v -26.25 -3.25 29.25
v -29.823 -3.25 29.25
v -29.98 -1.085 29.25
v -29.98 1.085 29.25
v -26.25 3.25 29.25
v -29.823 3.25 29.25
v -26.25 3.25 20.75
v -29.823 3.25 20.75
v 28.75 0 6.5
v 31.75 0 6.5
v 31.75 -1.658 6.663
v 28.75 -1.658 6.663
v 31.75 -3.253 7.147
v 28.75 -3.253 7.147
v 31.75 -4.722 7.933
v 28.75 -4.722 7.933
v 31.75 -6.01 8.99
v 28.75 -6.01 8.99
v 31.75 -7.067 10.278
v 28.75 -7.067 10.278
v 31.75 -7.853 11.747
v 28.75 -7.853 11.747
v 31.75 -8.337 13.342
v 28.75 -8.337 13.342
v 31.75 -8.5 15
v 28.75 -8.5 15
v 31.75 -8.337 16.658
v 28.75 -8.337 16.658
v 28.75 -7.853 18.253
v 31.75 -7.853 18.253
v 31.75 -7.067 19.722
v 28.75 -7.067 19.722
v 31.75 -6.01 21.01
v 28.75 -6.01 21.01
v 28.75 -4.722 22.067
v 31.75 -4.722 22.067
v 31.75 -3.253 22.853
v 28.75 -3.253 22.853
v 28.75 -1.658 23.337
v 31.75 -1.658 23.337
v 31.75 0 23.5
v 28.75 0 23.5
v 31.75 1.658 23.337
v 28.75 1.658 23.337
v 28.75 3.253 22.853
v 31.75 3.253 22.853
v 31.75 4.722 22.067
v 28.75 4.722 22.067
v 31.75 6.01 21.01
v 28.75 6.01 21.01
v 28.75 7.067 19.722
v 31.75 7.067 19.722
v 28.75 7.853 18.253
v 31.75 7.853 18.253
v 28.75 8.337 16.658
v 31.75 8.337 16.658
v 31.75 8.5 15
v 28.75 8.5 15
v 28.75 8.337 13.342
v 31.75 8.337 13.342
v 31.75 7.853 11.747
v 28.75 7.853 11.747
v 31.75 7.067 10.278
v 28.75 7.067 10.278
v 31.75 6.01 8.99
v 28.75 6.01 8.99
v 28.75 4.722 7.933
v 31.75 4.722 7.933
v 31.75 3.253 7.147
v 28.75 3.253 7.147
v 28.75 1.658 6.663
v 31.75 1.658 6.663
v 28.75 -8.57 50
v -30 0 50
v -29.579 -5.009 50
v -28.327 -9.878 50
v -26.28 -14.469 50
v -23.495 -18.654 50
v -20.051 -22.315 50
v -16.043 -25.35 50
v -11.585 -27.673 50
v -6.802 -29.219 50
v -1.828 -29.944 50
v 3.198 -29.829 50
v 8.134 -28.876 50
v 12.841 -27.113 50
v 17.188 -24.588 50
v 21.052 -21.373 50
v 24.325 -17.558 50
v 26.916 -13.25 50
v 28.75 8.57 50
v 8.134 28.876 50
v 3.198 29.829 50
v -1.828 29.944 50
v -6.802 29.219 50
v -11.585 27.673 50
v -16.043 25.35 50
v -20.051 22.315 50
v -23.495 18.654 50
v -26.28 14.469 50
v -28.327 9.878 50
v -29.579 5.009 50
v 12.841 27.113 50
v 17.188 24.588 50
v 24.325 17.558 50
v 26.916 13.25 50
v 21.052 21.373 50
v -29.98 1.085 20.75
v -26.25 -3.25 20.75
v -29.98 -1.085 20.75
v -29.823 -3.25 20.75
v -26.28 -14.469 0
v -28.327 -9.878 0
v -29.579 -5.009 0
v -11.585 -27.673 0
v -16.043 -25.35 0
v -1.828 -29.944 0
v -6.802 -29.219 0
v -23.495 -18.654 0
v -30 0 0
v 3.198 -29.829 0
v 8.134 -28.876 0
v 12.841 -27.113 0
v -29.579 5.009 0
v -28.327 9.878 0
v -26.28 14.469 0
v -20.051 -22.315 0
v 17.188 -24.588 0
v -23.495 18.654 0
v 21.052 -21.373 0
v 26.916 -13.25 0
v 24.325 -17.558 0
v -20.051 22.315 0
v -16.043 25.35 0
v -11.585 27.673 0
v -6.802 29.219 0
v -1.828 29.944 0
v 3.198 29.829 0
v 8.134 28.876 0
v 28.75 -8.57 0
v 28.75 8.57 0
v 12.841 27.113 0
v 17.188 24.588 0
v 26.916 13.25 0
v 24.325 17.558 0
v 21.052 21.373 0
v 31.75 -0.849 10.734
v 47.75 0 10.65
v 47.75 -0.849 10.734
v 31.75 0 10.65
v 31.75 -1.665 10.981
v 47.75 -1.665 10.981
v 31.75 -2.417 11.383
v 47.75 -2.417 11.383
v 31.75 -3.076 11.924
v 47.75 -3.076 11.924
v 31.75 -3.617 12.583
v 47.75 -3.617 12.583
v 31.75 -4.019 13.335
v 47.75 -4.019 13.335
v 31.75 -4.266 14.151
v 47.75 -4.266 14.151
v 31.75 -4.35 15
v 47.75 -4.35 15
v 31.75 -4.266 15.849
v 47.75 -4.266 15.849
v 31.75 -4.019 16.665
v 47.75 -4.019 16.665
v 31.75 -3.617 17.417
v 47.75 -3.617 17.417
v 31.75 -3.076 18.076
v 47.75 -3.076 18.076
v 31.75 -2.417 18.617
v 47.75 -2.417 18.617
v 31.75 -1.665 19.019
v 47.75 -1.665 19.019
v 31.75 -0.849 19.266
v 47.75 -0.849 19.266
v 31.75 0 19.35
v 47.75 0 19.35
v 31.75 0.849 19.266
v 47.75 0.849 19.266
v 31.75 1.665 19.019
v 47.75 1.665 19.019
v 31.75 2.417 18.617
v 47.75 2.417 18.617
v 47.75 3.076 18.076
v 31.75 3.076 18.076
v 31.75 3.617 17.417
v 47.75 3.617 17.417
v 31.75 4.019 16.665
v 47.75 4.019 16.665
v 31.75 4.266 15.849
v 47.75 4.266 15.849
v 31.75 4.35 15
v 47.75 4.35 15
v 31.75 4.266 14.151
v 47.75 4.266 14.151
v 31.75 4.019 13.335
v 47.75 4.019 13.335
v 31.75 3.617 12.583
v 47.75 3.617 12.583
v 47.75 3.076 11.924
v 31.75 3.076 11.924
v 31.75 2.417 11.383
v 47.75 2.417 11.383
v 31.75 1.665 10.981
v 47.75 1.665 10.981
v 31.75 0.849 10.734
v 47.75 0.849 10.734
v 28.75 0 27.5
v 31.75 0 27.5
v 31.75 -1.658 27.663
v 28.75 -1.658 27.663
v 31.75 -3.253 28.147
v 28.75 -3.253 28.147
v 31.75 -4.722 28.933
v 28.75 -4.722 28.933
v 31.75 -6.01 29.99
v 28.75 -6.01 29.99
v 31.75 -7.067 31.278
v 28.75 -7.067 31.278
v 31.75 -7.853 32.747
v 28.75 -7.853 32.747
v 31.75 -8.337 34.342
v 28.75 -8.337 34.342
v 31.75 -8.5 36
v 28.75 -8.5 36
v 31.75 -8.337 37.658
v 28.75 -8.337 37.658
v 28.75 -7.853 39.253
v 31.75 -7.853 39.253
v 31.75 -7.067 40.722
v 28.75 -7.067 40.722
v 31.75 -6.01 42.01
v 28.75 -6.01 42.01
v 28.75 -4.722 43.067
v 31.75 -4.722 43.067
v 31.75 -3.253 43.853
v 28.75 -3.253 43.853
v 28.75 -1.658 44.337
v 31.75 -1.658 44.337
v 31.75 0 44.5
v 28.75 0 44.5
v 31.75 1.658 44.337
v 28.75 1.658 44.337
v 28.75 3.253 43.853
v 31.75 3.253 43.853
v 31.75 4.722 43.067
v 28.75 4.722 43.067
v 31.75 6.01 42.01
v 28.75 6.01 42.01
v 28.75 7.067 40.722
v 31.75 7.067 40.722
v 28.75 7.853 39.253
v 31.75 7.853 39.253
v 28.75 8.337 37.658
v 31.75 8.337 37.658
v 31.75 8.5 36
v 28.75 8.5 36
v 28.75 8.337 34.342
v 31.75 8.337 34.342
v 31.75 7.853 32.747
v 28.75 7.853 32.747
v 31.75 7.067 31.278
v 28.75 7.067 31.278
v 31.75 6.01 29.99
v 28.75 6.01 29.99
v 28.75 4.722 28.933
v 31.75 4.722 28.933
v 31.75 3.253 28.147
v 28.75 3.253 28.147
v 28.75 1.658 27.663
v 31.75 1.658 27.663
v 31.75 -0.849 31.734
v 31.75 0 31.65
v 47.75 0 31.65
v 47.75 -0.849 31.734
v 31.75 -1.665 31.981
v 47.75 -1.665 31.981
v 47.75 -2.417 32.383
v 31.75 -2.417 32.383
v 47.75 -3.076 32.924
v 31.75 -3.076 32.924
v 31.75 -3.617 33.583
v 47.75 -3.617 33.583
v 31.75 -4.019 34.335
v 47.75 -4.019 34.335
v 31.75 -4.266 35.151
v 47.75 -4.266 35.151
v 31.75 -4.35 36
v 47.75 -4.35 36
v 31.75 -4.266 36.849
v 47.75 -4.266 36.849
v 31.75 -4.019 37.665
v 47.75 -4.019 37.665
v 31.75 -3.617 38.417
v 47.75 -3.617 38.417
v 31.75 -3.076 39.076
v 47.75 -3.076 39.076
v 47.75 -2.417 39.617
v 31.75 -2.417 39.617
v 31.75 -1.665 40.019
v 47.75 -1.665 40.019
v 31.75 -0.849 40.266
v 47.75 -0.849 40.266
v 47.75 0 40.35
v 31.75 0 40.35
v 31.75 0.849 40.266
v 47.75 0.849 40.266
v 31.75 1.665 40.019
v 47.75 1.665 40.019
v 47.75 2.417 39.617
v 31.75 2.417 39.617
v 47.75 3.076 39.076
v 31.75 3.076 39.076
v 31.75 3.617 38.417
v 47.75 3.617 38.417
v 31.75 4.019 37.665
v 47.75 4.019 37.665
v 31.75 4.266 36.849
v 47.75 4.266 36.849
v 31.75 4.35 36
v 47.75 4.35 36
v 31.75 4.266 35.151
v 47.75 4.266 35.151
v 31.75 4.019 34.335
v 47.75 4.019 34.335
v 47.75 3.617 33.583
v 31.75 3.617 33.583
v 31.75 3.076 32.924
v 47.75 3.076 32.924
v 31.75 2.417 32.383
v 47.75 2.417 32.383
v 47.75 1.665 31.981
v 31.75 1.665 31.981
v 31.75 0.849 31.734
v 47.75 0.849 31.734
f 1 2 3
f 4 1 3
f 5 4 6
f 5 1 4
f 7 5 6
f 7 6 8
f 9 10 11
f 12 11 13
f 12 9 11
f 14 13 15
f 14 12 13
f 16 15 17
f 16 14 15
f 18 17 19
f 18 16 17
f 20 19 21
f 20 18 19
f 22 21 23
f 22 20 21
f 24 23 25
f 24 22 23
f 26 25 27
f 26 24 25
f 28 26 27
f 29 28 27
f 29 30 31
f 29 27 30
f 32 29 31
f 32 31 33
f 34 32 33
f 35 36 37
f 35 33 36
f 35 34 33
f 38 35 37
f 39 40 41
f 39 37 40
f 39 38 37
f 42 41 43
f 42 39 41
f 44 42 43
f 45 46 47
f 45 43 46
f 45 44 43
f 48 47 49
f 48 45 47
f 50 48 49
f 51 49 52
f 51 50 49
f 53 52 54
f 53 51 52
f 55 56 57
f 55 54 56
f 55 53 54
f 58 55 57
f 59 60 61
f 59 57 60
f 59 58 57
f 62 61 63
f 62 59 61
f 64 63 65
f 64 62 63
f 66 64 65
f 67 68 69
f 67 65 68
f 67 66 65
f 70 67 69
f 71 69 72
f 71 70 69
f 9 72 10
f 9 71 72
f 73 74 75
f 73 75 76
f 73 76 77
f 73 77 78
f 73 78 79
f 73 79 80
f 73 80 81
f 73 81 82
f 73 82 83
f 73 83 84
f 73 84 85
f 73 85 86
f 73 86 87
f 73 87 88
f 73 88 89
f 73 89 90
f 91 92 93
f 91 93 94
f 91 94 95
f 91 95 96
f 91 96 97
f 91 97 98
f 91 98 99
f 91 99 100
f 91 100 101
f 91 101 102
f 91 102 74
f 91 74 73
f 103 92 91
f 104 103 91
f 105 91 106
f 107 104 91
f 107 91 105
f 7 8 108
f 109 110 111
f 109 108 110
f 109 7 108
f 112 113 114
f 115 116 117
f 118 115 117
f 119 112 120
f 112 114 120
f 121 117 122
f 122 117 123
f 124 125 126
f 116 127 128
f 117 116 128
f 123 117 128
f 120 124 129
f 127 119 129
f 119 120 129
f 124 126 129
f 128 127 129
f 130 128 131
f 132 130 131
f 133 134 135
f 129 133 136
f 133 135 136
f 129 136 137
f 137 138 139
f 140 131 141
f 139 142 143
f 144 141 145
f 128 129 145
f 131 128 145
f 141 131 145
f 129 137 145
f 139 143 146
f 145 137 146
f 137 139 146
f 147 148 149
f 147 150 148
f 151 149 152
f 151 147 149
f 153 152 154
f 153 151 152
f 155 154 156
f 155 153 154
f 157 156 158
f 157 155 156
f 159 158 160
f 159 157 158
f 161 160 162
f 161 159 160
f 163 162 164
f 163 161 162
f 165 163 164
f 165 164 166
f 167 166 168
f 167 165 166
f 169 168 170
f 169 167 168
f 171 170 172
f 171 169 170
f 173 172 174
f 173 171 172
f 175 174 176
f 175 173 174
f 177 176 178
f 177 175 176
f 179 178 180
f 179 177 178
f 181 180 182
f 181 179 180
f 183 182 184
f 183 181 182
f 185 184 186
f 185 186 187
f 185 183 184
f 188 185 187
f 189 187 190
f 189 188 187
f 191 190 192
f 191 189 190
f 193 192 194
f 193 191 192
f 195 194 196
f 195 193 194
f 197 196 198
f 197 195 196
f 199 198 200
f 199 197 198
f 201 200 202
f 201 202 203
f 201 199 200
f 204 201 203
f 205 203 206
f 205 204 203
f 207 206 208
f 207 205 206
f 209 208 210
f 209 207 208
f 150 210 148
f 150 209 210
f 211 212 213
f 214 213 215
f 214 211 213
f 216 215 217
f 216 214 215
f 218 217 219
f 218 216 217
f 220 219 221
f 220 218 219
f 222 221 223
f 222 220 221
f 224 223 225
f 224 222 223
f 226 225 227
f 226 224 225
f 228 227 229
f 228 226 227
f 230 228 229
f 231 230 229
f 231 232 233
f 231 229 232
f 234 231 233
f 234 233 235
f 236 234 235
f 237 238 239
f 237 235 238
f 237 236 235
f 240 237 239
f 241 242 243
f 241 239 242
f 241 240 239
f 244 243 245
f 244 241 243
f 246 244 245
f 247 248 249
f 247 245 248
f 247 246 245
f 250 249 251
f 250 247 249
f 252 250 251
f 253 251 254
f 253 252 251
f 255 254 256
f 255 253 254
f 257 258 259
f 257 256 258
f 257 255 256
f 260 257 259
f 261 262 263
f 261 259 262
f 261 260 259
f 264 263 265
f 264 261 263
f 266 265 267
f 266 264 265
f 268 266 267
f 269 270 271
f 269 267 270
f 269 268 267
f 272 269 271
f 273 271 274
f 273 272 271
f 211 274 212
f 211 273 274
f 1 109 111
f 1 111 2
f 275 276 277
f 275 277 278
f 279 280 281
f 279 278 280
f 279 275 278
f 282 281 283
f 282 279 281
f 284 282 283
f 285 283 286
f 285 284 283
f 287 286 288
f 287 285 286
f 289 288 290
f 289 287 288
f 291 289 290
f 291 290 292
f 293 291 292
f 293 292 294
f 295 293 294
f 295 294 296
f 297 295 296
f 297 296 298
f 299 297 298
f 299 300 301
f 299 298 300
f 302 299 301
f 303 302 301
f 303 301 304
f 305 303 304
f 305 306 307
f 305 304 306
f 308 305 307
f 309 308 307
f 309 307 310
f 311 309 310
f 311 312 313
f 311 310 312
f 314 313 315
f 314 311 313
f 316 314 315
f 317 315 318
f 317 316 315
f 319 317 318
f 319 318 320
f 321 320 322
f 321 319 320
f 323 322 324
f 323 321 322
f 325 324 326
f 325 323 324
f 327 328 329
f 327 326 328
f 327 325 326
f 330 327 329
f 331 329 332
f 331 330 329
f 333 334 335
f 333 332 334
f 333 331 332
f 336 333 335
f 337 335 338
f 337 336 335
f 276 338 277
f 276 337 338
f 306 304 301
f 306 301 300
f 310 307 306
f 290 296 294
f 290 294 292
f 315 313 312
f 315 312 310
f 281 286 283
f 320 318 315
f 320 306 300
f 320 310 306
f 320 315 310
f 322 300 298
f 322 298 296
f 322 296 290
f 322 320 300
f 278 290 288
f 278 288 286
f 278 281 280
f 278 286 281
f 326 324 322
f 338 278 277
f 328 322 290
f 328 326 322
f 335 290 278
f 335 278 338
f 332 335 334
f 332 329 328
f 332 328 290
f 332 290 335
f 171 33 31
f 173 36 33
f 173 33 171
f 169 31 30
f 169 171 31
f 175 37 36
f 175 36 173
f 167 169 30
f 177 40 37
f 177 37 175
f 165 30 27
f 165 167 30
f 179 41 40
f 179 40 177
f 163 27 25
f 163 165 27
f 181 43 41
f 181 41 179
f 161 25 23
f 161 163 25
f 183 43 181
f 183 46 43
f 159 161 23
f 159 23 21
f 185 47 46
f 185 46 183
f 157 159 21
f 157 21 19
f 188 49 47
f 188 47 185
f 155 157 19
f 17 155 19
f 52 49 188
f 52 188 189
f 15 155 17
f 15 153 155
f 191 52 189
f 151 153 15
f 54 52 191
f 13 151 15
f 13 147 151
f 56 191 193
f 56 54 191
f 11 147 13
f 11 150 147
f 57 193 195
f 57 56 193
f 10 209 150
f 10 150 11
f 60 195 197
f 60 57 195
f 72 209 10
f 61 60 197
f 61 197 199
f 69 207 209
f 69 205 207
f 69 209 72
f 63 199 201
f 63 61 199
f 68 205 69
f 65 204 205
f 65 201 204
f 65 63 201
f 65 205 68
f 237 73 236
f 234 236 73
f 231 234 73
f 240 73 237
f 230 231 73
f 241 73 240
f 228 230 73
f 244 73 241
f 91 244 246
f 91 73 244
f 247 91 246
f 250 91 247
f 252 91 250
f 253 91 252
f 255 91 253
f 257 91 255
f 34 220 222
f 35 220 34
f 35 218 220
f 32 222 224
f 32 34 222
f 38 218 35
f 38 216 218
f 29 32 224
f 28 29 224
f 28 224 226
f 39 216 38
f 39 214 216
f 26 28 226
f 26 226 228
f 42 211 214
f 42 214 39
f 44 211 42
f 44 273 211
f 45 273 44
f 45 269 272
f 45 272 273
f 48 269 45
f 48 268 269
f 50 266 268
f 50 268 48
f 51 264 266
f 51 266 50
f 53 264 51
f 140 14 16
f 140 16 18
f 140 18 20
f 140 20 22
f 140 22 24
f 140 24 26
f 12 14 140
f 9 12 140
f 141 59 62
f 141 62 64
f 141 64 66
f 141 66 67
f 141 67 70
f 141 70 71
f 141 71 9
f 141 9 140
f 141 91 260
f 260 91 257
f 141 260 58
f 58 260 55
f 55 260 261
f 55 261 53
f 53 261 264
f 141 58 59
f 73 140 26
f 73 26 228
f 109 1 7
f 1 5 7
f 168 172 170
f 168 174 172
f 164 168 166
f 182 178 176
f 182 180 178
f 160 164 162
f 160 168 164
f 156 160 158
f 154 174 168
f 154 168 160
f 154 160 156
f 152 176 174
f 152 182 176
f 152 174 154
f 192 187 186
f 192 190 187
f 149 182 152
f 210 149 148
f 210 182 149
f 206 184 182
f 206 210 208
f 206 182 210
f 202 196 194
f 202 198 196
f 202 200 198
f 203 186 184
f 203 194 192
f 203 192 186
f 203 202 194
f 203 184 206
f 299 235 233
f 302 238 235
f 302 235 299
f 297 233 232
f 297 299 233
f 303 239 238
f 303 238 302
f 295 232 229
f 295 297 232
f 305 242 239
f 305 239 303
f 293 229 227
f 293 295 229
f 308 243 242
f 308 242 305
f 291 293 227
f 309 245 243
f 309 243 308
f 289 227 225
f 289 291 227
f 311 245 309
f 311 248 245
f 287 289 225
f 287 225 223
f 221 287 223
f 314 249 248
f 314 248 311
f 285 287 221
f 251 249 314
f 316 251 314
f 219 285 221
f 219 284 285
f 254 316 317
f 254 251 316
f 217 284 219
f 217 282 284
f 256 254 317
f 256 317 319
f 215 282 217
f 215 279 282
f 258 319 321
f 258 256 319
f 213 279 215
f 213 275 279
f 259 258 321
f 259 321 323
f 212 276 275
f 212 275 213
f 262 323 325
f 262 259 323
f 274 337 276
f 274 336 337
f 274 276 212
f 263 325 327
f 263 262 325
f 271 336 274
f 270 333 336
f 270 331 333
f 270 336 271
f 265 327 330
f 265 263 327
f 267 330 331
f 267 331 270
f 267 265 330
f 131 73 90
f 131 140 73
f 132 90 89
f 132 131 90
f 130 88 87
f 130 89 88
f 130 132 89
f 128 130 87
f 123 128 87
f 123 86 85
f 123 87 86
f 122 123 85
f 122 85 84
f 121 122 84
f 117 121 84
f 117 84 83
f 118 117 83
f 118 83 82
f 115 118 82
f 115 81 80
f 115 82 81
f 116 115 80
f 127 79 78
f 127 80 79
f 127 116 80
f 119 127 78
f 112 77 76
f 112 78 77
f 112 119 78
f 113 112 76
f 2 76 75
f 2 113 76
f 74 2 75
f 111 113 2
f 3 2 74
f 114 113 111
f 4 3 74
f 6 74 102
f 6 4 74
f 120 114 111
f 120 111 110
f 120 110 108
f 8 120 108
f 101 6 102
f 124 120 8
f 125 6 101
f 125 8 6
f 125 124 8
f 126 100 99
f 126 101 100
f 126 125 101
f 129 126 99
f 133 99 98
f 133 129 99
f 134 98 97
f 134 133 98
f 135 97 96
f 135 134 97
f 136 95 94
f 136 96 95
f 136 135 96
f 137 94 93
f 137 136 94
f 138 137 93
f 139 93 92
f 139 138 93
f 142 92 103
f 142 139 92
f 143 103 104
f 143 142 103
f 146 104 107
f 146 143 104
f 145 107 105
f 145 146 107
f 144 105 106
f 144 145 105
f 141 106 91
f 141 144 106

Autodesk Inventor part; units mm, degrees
ref_plane "YZ Plane" through (0, 0, 0) normal (1, 0, 0) x (0, 1, 0)
ref_plane "XZ Plane" through (0, 0, 0) normal (0, 1, 0) x (-1, 0, 0)
ref_plane "XY Plane" through (0, 0, 0) normal (0, 0, 1) x (1, 0, 0)
sketch "Sketch1" plane through (0, 0, 0) normal (0, 0, 1) x (1, 0, 0)
  circle A0 centre (0, 0) radius 30
  dimension "d0" = 60
extrude "Extrusion1" add sketch "Sketch1" along normal blind 50
sketch "Sketch2" plane through (0, 0, 50) normal (0, 0, 1) x (1, 0, 0)
  circle A0 centre (0, 0) radius 30 construction
  line L0 (30, 0) -> (28.75, 0) construction
  line L1 (28.75, 16.5201) -> (34.9612, 16.5201)
  line L2 (34.9612, 16.5201) -> (34.9612, -18.249)
  line L3 (34.9612, -18.249) -> (28.75, -18.249)
  line L4 (28.75, -18.249) -> (28.75, 16.5201)
  dimension "d3" = 1.25
extrude "Extrusion2" cut sketch "Sketch2" against normal through all
sketch "Sketch3" plane through (28.75, -8.5696, 50) normal (1, 0, 0) x (0, 0, -1)
  line L0 (0, 38.5696) -> (0, -21.4304) construction
  line L1 (0, 8.5696) -> (14, 8.5696) construction
  circle A0 centre (14, 8.5696) radius 8.5
  point P0 (50, 8.5696)
  dimension "d6" = 14
  dimension "d7" = 17
extrude "Extrusion3" add sketch "Sketch3" along normal blind 3
sketch "Sketch4" plane through (28.75, -8.5696, 50) normal (1, 0, 0) x (0, 0, -1)
  line L0 (0, 0) -> (0, 17.1391) projected
  line L1 (0, 8.5696) -> (35, 8.5696) construction
  circle A0 centre (35, 8.5696) radius 8.5
  point P0 (50, 8.5696)
  dimension "d10" = 35
  dimension "d11" = 17
extrude "Extrusion4" add sketch "Sketch4" along normal blind 3
sketch "Sketch5" plane through (31.75, 0, 36) normal (1, 0, 0) x (0, 0, -1)
  circle A0 centre (0, 0) radius 8.5 projected
  circle A1 centre (0, 0) radius 4.35
  circle A2 centre (21, 0) radius 8.5 projected
  line L0 (12.5, 0) -> (21, 0)
  circle A3 centre (21, 0) radius 4.35
  point P0 (36, 0)
  dimension "d14" = 8.7
  dimension "d15" = 8.7
extrude "Extrusion5" add sketch "Sketch5" along normal blind 16 contours A1 | A3
sketch "Sketch6" plane through (28.75, -8.5696, 50) normal (1, 0, 0) x (0, 0, -1)
  line L0 (25, 8.5696) -> (29.25, 8.5696) construction
  line L1 (29.25, 8.5696) -> (29.25, 5.3196) construction
  line L2 (29.25, 5.3196) -> (20.75, 5.3196)
  line L3 (20.75, 5.3196) -> (20.75, 11.8196)
  line L4 (20.75, 11.8196) -> (29.25, 11.8196)
  line L5 (29.25, 11.8196) -> (29.25, 5.3196)
  point P0 (50, 8.5696)
  dimension "d18" = 4.25
  dimension "d19" = 3.25
  dimension "d20" = 8.5
  dimension "d21" = 6.5
extrude "Extrusion6" cut sketch "Sketch6" against normal through all
sketch "Sketch7" plane through (28.75, -8.5696, 50) normal (1, 0, 0) x (0, 0, -1)
  line L0 (29.25, 5.3196) -> (27.1459, 5.3196) projected
  line L1 (29.25, 5.3196) -> (20.75, 5.3196)
  line L2 (20.75, 5.3196) -> (20.75, 11.8196)
  line L3 (20.75, 11.8196) -> (29.25, 11.8196)
  line L4 (29.25, 11.8196) -> (29.25, 5.3196)
  point P0 (50, 8.5696)
  dimension "d24" = 8.5
  dimension "d25" = 6.5
extrude "Extrusion7" add sketch "Sketch7" against normal blind 55
properties part number "reservoir pump combo pump"
